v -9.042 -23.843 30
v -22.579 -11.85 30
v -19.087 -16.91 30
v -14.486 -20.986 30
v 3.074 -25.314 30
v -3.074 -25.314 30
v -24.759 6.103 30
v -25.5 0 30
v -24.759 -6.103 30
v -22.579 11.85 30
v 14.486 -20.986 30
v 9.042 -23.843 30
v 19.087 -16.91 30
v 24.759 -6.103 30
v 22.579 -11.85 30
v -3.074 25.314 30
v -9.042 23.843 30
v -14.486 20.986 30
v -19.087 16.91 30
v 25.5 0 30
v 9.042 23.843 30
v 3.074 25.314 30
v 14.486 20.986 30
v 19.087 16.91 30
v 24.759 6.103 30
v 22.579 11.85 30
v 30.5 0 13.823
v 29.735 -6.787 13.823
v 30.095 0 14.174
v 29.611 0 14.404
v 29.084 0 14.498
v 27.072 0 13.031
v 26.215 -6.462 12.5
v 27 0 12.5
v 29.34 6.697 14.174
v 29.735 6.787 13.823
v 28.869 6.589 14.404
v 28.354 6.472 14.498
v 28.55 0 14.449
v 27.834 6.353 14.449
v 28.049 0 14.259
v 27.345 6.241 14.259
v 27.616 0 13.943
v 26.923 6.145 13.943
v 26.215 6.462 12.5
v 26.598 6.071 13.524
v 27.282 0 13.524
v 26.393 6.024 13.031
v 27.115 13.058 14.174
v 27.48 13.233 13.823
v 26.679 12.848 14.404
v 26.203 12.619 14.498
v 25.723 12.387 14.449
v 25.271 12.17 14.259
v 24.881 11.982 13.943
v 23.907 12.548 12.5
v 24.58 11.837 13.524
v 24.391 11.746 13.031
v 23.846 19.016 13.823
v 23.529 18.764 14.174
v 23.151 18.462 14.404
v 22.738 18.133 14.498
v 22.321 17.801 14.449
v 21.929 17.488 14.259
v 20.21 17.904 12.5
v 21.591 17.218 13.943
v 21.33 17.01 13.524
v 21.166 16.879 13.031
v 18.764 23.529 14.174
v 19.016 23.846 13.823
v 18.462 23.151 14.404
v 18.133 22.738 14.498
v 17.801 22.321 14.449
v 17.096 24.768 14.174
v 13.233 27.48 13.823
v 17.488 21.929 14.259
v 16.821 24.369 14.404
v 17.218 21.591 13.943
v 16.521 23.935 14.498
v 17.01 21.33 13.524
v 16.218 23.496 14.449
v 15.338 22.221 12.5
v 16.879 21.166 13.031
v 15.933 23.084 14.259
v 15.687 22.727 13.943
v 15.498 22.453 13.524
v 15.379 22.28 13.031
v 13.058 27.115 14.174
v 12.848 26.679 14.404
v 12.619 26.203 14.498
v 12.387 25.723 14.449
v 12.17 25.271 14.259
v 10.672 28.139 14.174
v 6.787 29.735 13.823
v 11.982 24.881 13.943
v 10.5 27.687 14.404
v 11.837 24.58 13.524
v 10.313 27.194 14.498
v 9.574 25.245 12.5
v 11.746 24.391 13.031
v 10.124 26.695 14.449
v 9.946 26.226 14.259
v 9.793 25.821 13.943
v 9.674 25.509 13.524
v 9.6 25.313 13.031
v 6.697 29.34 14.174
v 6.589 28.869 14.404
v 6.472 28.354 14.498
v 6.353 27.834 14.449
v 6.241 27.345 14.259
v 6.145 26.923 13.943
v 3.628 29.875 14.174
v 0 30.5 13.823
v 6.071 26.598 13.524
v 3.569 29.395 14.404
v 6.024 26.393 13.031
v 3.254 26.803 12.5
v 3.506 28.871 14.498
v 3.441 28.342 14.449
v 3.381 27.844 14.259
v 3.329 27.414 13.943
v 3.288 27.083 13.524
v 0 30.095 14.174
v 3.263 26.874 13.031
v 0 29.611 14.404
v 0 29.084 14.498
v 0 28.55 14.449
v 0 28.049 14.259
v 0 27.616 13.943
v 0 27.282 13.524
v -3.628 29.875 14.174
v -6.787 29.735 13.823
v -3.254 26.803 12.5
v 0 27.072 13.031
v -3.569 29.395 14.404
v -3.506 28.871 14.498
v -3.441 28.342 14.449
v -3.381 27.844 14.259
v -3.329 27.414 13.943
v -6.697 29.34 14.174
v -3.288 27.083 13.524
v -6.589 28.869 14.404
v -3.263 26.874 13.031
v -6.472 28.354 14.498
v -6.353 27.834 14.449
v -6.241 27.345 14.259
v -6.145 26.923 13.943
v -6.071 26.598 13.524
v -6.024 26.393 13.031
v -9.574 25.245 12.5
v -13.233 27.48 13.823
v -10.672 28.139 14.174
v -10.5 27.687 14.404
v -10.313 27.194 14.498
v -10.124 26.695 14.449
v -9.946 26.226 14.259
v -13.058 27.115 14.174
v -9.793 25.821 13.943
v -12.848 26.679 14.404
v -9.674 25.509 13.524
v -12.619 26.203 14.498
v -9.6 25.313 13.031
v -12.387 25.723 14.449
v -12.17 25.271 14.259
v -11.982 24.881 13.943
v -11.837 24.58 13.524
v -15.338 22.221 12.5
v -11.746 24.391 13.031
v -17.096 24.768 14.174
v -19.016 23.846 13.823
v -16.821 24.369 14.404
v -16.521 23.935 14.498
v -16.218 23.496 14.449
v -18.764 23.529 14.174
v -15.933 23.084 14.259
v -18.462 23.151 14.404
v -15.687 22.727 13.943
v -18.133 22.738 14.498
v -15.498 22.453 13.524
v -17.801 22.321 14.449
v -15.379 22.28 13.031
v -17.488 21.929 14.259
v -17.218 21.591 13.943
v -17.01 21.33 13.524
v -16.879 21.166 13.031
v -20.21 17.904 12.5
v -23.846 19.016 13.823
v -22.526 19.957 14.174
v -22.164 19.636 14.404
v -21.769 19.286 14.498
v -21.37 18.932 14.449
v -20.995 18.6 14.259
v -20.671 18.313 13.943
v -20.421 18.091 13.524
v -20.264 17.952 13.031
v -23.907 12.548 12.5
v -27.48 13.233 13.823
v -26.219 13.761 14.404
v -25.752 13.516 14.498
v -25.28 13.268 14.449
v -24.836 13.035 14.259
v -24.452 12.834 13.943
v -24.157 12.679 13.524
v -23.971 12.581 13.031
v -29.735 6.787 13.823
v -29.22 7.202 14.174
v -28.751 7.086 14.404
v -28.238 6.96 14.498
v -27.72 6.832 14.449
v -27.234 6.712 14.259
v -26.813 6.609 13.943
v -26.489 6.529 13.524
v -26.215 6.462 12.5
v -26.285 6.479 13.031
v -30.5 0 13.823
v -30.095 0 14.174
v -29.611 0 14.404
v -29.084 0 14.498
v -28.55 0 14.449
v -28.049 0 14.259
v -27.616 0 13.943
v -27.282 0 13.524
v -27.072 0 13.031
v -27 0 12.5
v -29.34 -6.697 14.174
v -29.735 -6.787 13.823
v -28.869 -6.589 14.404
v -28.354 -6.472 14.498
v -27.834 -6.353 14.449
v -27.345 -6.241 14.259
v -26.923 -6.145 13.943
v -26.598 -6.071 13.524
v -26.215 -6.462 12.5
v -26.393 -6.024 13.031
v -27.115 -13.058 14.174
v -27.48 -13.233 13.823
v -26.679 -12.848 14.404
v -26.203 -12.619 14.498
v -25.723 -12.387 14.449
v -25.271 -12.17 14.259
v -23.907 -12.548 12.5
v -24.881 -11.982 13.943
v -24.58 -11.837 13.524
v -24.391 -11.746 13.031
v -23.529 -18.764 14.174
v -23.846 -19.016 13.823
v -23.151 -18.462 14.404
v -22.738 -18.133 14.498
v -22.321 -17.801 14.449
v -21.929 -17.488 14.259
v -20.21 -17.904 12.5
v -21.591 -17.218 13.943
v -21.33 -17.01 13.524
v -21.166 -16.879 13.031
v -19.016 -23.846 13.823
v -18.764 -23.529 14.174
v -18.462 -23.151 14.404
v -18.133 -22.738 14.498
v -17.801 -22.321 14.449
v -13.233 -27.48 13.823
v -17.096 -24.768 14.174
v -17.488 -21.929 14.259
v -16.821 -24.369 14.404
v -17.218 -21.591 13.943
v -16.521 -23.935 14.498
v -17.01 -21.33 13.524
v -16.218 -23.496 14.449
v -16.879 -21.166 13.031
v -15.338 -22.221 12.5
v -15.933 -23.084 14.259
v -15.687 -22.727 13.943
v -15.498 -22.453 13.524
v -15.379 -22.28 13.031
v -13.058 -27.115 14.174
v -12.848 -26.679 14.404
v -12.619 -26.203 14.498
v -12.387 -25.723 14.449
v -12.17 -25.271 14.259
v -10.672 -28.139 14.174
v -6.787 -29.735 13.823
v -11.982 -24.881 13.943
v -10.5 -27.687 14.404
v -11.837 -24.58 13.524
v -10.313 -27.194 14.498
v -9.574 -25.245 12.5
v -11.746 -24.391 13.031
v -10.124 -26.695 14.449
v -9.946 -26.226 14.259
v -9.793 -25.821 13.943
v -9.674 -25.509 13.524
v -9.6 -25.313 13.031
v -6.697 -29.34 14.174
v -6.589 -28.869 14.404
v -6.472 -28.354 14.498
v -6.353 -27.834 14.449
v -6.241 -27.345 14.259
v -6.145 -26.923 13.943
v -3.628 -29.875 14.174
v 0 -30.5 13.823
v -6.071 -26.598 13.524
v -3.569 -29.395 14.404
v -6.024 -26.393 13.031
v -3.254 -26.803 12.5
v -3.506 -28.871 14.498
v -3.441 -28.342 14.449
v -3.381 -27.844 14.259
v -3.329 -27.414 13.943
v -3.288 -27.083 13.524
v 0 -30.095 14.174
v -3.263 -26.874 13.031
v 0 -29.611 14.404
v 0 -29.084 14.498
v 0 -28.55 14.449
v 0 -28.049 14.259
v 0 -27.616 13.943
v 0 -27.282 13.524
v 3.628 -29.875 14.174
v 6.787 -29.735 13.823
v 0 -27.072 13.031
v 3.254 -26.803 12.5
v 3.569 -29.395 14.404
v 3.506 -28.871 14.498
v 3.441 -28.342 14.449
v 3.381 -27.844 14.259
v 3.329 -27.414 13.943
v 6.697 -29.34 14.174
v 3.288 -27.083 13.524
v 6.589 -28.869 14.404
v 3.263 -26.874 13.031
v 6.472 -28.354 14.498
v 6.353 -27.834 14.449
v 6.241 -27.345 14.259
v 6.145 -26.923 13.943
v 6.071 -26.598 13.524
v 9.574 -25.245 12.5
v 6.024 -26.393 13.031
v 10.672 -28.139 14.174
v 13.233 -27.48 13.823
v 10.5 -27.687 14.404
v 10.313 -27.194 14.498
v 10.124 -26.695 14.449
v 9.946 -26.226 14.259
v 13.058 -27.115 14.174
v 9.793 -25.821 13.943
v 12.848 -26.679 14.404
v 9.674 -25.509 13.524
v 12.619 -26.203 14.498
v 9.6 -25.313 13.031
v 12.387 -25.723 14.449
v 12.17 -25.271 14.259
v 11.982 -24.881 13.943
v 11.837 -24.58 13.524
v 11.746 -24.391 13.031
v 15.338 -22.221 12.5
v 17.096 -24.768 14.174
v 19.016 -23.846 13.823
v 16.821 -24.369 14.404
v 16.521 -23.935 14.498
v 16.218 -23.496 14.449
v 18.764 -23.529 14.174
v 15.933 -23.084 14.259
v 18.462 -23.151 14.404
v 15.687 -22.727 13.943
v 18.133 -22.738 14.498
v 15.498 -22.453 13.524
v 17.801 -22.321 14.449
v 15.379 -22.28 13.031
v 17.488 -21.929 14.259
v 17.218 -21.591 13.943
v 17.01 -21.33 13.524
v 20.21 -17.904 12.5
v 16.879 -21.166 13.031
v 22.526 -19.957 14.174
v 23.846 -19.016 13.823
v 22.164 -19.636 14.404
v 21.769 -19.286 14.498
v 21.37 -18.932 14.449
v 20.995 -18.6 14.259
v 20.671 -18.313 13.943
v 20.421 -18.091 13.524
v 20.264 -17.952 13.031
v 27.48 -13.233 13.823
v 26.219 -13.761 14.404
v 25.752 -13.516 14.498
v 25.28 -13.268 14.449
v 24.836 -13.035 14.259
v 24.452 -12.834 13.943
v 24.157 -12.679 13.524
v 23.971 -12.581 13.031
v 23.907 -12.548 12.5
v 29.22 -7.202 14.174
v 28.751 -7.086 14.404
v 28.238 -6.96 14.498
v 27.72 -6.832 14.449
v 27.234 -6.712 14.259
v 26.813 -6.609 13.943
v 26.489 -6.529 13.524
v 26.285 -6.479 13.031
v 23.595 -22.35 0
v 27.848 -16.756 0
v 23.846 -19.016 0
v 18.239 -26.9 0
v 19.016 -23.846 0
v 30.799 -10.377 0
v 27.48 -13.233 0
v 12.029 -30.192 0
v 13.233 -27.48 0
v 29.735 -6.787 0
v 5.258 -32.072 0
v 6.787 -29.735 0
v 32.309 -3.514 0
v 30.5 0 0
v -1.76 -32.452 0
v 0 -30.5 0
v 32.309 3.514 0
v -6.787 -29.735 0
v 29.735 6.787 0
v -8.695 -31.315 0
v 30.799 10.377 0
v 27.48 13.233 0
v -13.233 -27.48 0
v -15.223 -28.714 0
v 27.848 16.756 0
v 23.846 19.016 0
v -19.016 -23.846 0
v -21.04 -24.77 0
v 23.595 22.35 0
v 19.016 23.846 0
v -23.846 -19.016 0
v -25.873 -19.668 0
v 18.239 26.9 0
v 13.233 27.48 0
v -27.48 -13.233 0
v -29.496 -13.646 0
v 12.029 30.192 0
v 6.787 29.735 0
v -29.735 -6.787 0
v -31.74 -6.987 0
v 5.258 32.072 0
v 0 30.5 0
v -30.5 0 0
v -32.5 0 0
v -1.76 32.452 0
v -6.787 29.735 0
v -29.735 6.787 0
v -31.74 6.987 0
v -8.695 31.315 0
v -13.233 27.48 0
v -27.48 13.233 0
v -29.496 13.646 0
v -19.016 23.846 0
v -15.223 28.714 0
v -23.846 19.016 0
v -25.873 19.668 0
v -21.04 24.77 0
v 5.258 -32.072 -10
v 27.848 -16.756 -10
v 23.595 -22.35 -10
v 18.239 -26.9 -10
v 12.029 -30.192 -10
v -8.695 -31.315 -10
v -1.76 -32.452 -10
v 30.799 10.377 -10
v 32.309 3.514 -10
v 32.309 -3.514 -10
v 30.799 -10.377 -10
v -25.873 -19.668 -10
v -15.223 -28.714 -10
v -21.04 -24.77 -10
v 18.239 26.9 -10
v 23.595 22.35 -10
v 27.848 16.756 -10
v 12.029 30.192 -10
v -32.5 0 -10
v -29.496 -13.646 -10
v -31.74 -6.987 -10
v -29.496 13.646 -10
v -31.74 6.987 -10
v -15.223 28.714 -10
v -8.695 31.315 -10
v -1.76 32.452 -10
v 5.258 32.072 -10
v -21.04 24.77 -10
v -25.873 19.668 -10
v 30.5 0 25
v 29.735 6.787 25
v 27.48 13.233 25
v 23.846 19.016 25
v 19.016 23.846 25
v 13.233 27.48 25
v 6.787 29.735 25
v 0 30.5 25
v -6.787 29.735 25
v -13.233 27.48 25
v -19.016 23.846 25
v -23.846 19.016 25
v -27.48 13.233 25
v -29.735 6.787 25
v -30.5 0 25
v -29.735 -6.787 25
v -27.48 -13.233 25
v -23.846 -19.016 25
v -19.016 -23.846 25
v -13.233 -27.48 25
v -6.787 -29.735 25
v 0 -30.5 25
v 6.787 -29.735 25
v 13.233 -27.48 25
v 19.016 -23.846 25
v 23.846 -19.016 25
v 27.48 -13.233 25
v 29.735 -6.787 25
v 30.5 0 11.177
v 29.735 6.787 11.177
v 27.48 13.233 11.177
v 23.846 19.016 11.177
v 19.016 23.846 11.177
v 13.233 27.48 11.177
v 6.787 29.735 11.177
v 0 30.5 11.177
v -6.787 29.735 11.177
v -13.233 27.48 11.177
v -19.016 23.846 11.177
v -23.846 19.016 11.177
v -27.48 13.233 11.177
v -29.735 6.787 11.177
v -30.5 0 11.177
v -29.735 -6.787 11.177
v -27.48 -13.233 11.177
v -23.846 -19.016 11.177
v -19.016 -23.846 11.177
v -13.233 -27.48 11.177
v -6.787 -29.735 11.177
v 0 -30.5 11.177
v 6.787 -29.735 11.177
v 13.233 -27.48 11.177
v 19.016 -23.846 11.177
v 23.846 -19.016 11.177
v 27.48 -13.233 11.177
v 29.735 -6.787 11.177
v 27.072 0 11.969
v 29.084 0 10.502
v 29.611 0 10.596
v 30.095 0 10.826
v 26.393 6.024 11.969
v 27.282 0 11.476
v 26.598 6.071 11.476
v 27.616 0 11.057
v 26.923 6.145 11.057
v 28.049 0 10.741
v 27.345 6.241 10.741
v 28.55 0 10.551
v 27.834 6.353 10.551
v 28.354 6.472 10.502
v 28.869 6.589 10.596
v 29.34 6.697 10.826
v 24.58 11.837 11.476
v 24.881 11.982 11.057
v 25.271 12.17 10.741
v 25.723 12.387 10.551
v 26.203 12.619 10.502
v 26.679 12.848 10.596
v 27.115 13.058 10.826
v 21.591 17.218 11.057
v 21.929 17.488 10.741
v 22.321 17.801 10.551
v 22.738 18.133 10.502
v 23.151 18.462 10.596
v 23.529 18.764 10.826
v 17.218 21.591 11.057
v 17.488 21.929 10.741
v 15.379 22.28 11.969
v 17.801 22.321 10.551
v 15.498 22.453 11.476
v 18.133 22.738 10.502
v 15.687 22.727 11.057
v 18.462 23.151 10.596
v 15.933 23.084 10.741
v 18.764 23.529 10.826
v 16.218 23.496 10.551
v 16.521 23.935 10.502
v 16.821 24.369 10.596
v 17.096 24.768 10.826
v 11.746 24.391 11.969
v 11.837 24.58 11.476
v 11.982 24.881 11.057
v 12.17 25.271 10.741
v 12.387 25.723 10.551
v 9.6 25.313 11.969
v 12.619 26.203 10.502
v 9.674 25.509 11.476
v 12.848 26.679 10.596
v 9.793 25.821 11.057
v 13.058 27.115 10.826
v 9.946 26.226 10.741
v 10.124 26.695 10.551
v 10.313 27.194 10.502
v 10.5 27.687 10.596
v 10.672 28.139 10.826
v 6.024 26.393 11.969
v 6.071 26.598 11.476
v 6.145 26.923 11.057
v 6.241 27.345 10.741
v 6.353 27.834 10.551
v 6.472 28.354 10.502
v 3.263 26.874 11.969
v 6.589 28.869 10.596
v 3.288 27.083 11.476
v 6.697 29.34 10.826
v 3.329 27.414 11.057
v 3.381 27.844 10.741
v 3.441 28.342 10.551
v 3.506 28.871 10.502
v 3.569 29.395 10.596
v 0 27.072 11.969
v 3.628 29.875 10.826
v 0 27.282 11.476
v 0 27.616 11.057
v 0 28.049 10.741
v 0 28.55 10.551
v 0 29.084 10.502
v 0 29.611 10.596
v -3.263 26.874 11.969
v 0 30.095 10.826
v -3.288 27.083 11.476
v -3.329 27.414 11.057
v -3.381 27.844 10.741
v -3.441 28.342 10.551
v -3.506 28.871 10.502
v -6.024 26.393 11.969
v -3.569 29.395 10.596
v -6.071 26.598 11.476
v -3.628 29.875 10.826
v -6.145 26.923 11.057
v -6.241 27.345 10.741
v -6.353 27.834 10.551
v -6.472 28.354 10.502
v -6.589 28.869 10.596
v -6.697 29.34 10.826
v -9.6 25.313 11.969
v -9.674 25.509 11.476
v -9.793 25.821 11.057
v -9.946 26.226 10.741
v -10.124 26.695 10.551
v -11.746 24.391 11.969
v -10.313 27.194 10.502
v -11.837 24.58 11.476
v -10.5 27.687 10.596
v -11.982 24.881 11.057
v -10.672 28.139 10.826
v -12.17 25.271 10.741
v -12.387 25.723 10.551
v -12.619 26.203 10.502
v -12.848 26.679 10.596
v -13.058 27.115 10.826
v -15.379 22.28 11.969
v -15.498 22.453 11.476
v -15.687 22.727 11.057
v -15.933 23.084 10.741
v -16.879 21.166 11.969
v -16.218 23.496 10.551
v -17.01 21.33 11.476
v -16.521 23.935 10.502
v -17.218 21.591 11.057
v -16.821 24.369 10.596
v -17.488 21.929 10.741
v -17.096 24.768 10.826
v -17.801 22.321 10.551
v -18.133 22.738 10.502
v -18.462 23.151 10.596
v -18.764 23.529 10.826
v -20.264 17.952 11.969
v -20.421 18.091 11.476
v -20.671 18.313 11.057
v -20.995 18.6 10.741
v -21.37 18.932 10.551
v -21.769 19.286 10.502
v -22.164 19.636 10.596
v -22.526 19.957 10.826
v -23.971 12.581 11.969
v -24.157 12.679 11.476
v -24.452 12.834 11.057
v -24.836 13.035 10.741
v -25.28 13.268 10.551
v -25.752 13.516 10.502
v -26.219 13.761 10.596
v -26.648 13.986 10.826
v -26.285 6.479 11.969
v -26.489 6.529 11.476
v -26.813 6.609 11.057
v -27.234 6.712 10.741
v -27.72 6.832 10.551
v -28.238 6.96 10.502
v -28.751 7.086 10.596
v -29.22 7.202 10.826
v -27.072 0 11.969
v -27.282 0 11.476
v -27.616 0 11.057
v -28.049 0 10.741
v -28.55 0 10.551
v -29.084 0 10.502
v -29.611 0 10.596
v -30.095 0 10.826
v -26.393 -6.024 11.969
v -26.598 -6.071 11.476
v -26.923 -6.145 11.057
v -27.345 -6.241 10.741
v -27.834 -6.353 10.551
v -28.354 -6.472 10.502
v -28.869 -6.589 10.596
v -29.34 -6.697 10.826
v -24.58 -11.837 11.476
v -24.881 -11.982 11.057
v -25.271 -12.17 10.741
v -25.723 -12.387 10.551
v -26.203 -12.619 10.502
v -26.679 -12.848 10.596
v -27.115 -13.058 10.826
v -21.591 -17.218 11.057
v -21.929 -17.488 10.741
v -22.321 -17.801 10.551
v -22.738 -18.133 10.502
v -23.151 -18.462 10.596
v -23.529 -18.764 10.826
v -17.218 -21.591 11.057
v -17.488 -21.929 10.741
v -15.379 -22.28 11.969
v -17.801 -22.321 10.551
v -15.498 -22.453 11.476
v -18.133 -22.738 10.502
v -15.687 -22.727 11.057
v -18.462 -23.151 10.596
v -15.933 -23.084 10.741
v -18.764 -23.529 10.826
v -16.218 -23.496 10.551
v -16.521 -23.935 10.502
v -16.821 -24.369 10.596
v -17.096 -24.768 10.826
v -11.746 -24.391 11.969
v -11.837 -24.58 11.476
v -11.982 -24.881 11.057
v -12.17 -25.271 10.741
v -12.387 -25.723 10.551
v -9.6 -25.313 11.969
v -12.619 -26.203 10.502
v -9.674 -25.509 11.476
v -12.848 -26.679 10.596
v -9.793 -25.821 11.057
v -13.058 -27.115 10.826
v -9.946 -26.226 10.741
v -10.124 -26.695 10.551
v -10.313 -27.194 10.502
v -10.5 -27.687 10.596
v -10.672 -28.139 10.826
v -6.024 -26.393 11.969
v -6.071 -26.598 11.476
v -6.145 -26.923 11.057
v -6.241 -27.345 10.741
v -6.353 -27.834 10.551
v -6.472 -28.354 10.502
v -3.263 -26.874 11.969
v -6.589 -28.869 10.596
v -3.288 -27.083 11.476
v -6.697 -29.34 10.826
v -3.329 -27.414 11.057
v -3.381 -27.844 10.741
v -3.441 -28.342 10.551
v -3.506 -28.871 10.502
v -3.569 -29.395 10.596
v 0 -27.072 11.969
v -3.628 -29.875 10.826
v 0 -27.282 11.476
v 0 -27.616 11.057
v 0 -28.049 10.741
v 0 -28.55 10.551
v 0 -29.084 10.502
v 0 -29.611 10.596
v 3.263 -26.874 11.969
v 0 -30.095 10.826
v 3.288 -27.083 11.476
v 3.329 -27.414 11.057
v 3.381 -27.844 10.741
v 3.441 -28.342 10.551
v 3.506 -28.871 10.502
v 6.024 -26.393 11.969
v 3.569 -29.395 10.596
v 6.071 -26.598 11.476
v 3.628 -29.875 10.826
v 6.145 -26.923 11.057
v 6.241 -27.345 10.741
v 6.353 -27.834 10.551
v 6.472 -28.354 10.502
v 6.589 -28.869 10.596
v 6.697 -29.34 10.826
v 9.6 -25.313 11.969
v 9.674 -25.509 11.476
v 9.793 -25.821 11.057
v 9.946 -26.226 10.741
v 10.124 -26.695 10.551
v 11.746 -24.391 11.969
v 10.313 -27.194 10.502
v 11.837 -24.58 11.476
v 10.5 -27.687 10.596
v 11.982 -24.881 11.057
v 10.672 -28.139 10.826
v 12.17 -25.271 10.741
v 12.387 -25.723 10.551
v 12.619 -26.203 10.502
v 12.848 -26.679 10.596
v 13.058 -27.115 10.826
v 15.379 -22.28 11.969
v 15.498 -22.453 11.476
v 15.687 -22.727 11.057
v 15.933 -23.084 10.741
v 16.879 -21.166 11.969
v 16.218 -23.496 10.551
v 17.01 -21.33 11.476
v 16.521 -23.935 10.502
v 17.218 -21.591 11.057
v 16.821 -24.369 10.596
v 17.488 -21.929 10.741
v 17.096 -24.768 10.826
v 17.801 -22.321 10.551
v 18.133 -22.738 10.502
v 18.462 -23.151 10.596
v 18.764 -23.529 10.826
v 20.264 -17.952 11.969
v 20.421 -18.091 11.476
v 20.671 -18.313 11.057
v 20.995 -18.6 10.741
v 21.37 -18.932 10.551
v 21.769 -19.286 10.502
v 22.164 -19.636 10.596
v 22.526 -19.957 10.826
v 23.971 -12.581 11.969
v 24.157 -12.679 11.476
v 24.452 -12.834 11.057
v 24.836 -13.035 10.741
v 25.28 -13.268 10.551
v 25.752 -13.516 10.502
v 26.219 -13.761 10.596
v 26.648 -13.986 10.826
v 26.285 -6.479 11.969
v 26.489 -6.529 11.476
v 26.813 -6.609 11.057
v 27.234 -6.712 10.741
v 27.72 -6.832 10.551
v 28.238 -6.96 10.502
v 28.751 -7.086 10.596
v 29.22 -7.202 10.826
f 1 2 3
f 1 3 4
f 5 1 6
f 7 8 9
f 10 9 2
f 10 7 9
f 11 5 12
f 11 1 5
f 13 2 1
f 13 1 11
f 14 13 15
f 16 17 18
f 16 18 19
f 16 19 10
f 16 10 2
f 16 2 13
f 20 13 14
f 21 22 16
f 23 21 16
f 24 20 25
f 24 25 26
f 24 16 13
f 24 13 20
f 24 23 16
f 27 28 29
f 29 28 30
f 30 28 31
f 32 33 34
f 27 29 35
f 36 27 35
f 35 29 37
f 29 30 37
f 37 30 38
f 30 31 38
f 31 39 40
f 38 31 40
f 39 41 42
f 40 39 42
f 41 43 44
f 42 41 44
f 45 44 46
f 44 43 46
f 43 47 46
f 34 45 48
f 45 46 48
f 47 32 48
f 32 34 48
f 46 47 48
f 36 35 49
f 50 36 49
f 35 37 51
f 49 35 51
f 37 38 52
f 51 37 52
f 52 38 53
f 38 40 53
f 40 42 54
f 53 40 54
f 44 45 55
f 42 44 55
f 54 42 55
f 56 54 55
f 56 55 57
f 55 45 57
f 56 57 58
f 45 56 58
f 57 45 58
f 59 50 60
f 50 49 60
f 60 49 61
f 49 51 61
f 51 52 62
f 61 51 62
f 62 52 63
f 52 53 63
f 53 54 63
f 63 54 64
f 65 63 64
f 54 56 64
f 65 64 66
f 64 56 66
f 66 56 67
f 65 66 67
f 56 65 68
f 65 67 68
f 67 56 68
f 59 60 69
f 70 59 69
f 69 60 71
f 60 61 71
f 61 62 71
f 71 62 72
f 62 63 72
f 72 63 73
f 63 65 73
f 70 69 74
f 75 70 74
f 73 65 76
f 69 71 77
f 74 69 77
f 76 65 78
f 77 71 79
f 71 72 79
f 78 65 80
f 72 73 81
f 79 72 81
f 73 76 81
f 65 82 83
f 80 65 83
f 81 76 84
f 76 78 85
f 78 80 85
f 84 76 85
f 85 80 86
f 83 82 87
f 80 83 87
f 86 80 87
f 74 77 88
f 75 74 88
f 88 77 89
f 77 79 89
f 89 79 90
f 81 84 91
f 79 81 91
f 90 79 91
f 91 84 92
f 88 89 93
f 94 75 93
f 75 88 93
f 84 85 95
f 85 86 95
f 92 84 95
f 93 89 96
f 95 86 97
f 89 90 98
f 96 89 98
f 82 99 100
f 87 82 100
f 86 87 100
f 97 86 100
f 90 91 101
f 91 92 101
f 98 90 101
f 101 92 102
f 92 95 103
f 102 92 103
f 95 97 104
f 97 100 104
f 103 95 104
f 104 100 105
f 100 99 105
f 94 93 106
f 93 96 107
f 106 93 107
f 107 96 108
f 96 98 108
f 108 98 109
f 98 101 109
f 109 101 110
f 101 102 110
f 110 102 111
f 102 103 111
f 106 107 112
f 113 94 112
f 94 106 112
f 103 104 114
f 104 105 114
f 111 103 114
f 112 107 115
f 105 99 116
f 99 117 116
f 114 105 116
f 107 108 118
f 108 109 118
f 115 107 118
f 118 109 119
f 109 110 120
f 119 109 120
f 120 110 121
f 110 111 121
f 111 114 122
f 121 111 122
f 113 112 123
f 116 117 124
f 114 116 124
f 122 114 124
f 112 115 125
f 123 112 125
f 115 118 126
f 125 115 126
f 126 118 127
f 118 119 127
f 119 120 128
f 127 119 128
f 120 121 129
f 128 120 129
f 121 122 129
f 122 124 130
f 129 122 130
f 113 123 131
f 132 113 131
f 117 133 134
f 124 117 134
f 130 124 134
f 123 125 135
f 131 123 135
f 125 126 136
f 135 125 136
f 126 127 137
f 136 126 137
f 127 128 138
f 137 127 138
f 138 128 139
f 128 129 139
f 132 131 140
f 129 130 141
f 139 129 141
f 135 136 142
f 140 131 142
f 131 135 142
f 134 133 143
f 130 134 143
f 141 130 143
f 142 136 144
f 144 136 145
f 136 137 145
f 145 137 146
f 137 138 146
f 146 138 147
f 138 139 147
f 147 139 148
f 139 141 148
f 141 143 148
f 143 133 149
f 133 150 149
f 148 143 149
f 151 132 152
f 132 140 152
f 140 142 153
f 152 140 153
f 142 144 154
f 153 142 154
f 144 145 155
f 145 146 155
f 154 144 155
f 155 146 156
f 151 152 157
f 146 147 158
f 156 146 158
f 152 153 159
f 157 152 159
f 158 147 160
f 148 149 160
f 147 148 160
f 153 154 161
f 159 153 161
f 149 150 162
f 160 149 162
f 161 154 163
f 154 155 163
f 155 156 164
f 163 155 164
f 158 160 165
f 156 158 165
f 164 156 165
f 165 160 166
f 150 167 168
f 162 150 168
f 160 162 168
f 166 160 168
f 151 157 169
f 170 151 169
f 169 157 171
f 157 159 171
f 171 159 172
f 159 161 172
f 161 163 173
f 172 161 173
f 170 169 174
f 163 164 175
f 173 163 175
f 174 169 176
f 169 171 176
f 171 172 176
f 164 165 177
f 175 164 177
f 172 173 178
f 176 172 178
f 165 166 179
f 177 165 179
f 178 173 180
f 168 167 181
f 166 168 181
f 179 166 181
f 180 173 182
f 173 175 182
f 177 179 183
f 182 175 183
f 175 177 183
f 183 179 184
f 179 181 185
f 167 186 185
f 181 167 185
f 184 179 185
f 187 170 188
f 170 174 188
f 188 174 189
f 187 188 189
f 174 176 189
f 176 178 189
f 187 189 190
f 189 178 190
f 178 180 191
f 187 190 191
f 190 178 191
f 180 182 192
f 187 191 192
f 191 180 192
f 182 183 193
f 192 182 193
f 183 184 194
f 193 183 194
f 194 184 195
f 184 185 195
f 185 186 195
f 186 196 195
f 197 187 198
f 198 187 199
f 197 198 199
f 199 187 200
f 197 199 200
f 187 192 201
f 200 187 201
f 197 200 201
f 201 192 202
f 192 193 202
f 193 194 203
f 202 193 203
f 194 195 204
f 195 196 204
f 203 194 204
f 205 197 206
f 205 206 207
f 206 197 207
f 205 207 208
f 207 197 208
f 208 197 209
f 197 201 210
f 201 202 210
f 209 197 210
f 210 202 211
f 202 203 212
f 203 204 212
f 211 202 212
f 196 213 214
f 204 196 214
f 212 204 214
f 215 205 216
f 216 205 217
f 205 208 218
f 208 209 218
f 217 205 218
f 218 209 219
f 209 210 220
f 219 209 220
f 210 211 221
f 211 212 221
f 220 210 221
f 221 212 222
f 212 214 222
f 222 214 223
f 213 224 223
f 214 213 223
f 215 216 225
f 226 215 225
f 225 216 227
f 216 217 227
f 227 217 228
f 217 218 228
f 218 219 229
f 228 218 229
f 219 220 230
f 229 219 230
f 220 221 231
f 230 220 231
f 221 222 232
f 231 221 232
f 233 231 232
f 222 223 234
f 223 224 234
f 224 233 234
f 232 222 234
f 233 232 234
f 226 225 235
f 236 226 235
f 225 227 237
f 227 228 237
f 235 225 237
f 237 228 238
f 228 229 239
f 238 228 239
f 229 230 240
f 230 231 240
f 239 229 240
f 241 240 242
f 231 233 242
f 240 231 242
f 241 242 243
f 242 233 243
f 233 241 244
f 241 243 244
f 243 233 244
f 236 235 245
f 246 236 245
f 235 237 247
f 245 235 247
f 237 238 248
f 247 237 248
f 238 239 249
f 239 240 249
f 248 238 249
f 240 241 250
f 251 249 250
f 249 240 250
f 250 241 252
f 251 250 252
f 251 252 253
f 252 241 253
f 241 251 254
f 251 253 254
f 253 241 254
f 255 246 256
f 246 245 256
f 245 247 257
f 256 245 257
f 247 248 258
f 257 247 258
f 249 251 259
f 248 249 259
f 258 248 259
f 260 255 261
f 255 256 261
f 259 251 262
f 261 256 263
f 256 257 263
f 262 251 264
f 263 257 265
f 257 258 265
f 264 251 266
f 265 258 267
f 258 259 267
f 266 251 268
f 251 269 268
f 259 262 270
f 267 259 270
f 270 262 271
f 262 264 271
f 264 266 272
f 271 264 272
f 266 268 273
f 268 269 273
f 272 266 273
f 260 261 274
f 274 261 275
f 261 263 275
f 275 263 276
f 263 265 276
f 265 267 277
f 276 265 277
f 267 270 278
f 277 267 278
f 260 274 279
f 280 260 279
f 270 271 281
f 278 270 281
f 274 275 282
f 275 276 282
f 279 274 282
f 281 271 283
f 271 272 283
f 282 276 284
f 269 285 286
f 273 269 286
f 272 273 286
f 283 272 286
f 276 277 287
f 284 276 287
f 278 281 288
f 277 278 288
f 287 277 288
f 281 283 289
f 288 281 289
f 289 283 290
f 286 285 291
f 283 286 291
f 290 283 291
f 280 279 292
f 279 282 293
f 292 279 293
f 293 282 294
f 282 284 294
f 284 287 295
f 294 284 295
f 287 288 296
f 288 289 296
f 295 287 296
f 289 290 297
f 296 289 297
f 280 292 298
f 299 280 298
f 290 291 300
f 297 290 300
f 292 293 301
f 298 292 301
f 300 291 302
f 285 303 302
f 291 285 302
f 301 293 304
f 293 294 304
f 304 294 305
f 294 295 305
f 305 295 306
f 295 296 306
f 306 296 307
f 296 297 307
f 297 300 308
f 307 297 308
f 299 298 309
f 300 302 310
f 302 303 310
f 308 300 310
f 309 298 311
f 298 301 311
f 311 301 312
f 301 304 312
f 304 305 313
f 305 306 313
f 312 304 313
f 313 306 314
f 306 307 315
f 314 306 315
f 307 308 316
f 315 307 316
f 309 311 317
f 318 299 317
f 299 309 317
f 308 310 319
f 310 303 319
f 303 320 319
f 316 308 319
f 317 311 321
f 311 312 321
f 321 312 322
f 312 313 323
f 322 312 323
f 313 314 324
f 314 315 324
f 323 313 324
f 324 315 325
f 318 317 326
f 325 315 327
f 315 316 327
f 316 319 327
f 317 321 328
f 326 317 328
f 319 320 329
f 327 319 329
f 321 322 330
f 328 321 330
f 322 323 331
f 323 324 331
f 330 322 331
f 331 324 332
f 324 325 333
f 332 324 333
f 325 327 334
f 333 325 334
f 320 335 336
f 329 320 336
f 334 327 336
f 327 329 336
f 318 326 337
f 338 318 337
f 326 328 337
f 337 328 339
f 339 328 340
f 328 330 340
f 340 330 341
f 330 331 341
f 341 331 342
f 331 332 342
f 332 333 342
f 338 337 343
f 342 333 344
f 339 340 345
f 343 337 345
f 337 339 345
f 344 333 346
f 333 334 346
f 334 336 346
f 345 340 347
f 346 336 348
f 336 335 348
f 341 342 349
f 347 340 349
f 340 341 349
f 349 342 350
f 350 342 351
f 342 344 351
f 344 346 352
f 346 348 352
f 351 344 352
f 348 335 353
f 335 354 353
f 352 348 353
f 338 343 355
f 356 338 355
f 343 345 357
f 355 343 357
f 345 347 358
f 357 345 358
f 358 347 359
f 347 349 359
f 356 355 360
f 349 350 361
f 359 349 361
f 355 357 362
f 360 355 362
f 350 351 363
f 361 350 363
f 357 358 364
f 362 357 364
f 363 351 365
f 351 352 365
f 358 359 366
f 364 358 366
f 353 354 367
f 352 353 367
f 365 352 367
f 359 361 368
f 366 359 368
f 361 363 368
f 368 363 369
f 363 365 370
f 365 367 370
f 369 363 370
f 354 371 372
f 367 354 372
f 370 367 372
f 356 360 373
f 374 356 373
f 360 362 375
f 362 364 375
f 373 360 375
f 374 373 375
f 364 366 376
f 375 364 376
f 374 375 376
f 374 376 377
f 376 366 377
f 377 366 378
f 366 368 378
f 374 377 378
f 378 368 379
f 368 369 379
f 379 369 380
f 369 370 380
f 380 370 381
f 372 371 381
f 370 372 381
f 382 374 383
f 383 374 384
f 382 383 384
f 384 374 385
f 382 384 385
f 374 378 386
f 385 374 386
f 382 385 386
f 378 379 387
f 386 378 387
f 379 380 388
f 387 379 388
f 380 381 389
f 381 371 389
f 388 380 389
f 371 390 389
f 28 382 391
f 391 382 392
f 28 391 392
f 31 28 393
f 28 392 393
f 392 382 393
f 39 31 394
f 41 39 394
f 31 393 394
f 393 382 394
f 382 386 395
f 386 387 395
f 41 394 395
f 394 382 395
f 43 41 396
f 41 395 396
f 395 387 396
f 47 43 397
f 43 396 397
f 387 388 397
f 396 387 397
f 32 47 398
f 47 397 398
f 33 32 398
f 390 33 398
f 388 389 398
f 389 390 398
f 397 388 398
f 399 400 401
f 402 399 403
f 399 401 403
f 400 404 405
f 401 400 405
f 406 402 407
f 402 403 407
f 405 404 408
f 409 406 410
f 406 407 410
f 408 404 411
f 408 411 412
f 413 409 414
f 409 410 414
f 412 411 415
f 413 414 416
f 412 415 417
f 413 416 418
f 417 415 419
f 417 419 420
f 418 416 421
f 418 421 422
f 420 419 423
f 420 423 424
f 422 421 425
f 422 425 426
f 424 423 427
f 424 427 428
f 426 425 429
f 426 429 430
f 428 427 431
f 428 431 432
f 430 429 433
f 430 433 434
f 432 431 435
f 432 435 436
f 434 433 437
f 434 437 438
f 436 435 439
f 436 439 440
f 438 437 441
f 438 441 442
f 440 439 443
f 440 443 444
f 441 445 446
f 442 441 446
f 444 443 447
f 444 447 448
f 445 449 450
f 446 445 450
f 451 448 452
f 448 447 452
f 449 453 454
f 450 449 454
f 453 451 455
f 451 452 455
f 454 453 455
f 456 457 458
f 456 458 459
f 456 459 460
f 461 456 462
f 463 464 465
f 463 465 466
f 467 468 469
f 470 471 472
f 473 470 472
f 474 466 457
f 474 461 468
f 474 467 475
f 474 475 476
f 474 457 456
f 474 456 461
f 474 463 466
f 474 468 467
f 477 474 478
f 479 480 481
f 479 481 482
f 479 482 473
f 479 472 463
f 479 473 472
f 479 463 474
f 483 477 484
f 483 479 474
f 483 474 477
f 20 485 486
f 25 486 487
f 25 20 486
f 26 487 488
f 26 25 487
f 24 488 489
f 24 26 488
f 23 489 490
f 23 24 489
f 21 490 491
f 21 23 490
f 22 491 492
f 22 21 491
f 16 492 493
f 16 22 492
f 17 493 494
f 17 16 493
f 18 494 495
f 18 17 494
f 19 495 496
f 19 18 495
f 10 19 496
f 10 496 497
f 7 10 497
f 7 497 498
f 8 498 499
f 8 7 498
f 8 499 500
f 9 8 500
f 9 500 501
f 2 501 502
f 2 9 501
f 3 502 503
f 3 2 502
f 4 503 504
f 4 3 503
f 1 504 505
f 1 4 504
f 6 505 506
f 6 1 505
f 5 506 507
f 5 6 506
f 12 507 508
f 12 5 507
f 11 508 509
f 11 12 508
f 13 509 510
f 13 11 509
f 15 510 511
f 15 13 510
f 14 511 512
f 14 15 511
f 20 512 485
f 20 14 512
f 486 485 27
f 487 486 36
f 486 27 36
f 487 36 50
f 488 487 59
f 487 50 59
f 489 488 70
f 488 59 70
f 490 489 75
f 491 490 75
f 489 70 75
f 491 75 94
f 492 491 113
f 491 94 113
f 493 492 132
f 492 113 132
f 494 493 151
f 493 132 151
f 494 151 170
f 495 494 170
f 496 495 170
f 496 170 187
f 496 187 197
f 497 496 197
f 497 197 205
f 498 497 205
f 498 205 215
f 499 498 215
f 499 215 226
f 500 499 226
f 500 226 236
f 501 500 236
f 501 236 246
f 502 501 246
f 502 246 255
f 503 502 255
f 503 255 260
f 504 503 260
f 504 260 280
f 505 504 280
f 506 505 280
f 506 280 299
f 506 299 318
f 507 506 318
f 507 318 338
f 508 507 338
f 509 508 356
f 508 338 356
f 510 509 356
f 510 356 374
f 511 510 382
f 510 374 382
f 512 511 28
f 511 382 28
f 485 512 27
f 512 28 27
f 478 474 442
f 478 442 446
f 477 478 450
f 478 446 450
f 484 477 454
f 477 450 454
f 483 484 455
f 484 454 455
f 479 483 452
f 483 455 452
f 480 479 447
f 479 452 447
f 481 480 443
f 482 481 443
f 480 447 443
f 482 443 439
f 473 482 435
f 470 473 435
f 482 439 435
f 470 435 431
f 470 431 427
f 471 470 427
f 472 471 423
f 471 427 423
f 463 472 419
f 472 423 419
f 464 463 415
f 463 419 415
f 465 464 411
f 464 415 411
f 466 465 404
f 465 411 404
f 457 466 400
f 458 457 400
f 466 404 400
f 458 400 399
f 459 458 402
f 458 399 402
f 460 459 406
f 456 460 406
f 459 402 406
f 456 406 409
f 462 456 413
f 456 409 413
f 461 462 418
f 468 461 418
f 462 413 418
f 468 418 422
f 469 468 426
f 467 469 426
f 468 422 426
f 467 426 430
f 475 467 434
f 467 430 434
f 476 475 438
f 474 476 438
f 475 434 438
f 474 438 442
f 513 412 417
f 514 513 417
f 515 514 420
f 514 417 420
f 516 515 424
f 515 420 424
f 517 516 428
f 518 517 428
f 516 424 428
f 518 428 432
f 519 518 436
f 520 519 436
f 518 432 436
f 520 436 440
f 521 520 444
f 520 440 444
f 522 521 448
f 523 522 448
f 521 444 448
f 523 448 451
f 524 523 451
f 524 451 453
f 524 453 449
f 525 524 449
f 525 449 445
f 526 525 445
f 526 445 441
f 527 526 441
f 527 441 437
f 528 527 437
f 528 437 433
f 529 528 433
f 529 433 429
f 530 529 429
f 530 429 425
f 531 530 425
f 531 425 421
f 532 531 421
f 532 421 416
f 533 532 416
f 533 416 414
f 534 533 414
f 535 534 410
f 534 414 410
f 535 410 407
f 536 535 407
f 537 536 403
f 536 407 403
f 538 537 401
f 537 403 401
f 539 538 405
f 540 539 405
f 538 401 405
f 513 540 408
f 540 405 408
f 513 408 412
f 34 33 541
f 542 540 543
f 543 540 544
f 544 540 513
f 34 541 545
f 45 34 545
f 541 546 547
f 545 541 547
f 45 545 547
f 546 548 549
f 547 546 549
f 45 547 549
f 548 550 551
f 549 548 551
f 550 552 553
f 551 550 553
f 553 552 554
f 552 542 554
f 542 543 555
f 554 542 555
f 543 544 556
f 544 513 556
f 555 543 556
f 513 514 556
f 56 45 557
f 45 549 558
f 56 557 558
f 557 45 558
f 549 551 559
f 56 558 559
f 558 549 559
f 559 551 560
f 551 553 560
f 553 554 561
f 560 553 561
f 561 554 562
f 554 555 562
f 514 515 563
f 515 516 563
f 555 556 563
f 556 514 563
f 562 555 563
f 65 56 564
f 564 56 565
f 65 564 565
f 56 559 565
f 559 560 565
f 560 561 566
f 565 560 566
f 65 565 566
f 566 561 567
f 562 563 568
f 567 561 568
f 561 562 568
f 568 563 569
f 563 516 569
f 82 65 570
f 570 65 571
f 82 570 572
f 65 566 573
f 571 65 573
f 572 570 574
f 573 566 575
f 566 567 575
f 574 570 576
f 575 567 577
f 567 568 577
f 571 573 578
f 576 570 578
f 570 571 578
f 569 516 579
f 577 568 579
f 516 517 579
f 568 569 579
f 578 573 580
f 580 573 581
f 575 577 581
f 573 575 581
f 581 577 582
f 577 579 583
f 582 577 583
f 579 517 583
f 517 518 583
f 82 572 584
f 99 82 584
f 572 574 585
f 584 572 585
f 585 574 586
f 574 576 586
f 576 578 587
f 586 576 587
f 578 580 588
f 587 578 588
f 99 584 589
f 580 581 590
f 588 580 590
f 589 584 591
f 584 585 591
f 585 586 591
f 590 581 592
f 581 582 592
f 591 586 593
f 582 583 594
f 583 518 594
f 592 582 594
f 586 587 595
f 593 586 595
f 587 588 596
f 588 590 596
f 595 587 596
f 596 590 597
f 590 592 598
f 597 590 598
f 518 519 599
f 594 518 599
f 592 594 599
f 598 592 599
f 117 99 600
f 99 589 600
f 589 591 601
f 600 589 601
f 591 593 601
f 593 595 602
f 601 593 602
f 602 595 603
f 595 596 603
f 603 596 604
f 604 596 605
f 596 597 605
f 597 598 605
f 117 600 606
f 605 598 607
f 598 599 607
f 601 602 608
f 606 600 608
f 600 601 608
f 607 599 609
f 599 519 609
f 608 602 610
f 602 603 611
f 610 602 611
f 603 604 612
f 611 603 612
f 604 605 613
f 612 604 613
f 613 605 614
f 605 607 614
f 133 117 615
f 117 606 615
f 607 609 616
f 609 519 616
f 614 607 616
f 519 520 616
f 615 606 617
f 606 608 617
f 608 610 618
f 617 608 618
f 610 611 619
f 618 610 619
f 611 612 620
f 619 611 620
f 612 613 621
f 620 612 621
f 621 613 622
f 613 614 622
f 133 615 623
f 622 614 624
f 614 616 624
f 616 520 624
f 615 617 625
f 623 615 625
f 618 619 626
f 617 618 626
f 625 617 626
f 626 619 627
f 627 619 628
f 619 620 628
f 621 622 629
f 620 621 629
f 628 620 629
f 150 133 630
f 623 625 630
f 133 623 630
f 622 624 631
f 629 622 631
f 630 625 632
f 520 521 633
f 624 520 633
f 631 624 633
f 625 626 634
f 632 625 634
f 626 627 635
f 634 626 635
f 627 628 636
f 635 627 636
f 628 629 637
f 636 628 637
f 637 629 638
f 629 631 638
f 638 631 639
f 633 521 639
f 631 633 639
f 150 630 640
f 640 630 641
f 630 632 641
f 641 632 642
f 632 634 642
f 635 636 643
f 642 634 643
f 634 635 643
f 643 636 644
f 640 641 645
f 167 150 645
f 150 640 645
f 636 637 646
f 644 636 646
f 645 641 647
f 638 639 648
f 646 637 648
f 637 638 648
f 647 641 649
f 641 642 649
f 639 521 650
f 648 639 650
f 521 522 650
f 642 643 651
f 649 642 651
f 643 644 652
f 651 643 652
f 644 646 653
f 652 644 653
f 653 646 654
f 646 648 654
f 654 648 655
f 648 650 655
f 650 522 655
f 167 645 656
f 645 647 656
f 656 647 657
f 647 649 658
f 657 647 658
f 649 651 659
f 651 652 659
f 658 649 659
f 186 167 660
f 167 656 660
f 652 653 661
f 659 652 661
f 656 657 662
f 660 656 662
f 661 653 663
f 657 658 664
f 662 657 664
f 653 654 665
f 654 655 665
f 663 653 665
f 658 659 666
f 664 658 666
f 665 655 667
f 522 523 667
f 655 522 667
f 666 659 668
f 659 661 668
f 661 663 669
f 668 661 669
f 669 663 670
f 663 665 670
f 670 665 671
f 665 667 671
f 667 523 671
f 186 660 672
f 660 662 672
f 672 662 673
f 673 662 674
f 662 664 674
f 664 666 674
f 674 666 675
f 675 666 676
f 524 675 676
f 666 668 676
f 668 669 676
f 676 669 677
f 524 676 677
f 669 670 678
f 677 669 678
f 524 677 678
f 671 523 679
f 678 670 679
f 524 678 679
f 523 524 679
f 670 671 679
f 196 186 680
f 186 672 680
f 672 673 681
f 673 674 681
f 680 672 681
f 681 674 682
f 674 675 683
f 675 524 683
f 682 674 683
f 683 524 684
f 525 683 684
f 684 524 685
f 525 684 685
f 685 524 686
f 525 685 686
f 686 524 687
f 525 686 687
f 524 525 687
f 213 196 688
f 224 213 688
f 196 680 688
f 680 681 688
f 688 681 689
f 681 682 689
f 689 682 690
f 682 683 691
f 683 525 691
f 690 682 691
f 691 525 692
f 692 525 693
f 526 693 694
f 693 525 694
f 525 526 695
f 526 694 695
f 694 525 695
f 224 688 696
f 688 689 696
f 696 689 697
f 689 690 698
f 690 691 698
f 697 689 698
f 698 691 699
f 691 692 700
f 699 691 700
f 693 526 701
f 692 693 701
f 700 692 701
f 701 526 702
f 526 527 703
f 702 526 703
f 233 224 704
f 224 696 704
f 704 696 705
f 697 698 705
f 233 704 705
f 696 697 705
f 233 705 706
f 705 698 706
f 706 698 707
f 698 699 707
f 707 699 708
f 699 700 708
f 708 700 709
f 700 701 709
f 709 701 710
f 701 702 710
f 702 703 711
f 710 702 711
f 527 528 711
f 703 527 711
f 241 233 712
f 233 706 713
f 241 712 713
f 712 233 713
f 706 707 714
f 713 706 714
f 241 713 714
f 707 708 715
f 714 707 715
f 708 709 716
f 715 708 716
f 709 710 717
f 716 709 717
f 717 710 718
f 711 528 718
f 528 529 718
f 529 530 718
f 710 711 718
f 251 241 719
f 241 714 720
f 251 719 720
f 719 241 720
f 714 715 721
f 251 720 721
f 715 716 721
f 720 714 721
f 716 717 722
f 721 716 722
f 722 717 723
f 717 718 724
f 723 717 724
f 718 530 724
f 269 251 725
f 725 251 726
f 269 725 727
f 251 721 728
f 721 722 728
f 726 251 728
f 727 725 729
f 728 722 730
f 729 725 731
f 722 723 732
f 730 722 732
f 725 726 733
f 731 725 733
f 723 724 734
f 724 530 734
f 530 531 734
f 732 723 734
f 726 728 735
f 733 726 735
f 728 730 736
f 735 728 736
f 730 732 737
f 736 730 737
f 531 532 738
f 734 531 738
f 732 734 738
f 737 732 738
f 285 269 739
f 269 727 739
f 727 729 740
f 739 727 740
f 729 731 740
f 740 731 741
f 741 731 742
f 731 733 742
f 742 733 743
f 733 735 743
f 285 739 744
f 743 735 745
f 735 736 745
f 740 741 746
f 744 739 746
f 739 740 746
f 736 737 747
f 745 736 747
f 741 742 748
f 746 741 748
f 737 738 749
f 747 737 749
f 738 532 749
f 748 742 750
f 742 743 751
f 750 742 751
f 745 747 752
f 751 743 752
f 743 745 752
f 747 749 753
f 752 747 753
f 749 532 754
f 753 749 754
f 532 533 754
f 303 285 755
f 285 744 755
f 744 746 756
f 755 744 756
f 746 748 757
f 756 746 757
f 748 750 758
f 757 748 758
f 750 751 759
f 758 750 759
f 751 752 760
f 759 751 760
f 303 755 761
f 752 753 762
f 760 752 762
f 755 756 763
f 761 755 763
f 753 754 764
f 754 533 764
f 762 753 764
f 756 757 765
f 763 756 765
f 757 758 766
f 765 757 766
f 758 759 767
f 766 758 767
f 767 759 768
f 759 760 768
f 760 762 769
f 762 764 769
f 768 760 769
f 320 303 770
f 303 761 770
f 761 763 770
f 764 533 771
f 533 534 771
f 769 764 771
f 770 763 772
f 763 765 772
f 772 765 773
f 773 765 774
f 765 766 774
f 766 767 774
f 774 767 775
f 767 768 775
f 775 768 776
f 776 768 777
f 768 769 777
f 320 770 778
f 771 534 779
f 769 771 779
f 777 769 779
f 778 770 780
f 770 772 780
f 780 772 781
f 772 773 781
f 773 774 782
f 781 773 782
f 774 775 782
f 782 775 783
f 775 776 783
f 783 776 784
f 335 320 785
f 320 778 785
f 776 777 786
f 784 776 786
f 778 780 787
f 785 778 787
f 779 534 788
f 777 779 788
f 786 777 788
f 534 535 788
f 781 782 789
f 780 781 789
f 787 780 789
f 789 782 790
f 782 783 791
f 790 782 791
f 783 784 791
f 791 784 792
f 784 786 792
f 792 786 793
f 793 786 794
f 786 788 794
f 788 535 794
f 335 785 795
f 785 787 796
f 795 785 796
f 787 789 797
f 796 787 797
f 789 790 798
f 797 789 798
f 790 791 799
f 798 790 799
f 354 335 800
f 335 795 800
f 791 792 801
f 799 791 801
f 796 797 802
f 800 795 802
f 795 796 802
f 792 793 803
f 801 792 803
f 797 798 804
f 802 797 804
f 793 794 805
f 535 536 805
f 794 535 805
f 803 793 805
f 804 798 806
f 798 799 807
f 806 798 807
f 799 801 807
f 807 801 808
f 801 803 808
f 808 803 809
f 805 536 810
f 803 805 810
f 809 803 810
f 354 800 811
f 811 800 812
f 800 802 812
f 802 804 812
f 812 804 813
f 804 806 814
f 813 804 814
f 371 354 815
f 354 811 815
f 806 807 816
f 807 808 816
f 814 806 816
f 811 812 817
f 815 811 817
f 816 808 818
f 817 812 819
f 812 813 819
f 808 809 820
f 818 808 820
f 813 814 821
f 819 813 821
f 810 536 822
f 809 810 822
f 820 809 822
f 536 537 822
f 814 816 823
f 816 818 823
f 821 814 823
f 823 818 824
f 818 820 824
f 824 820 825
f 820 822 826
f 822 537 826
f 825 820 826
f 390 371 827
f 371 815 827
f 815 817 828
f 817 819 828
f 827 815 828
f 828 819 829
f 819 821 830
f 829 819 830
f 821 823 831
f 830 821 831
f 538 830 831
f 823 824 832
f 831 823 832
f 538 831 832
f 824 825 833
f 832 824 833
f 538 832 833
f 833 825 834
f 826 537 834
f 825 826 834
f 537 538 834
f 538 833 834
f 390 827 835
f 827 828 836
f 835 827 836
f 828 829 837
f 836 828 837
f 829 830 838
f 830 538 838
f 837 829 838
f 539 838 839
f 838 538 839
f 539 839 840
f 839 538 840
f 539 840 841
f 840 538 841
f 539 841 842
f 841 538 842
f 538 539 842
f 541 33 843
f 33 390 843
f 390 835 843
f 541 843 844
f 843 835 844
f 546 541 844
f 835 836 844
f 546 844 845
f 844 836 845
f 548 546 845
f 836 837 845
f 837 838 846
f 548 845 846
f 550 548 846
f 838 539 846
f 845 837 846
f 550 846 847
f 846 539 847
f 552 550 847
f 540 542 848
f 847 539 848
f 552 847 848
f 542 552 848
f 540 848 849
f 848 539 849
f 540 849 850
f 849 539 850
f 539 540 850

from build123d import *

# Parameters (mm, degrees)
ESQUISSE1_R        = 30.5
BOSS_EXTRU_1_DEPTH = 30
ESQUISSE2_R        = 32.5
BOSS_EXTRU_2_DEPTH = 10
CHANFREIN1_SIZE    = 5
ESQUISSE6_R        = 2


with BuildPart() as part:
    # Esquisse1 → Boss.-Extru.1 (new body)
    with BuildSketch(Plane.XY):
        Circle(ESQUISSE1_R)
    extrude(amount=BOSS_EXTRU_1_DEPTH)

    # Esquisse2 → Boss.-Extru.2 (add)
    with BuildSketch(Plane(origin=(0, 0, 0), x_dir=(-1, 0, 0), z_dir=(0, 0, -1))):
        Circle(ESQUISSE2_R)
    extrude(amount=BOSS_EXTRU_2_DEPTH)

    # Chanfrein1
    chanfrein1_edges = [part.edges().sort_by_distance(p)[0] for p in [
        (-30.5, 0, 30),
    ]]
    chamfer(chanfrein1_edges, length=CHANFREIN1_SIZE)

    # Enlèvement de matière-Balayage1: sweep along a path in Esquisse7
    with BuildLine(Plane.XY.offset(10)) as enl_vement_de_mati_re_balayage1_path:
        CenterArc((0, 0), 26.0040611, 0, 360)
    # Esquisse6 → Enlèvement de matière-Balayage1 (sweep, cut)
    with BuildSketch(Plane(origin=(0, 0, 0), x_dir=(1, 0, 0), z_dir=(0, 1, 0))):
        with Locations((-29, -12.5)):
            Circle(ESQUISSE6_R)
    sweep(path=enl_vement_de_mati_re_balayage1_path.line, mode=Mode.SUBTRACT)


solid = part.part
